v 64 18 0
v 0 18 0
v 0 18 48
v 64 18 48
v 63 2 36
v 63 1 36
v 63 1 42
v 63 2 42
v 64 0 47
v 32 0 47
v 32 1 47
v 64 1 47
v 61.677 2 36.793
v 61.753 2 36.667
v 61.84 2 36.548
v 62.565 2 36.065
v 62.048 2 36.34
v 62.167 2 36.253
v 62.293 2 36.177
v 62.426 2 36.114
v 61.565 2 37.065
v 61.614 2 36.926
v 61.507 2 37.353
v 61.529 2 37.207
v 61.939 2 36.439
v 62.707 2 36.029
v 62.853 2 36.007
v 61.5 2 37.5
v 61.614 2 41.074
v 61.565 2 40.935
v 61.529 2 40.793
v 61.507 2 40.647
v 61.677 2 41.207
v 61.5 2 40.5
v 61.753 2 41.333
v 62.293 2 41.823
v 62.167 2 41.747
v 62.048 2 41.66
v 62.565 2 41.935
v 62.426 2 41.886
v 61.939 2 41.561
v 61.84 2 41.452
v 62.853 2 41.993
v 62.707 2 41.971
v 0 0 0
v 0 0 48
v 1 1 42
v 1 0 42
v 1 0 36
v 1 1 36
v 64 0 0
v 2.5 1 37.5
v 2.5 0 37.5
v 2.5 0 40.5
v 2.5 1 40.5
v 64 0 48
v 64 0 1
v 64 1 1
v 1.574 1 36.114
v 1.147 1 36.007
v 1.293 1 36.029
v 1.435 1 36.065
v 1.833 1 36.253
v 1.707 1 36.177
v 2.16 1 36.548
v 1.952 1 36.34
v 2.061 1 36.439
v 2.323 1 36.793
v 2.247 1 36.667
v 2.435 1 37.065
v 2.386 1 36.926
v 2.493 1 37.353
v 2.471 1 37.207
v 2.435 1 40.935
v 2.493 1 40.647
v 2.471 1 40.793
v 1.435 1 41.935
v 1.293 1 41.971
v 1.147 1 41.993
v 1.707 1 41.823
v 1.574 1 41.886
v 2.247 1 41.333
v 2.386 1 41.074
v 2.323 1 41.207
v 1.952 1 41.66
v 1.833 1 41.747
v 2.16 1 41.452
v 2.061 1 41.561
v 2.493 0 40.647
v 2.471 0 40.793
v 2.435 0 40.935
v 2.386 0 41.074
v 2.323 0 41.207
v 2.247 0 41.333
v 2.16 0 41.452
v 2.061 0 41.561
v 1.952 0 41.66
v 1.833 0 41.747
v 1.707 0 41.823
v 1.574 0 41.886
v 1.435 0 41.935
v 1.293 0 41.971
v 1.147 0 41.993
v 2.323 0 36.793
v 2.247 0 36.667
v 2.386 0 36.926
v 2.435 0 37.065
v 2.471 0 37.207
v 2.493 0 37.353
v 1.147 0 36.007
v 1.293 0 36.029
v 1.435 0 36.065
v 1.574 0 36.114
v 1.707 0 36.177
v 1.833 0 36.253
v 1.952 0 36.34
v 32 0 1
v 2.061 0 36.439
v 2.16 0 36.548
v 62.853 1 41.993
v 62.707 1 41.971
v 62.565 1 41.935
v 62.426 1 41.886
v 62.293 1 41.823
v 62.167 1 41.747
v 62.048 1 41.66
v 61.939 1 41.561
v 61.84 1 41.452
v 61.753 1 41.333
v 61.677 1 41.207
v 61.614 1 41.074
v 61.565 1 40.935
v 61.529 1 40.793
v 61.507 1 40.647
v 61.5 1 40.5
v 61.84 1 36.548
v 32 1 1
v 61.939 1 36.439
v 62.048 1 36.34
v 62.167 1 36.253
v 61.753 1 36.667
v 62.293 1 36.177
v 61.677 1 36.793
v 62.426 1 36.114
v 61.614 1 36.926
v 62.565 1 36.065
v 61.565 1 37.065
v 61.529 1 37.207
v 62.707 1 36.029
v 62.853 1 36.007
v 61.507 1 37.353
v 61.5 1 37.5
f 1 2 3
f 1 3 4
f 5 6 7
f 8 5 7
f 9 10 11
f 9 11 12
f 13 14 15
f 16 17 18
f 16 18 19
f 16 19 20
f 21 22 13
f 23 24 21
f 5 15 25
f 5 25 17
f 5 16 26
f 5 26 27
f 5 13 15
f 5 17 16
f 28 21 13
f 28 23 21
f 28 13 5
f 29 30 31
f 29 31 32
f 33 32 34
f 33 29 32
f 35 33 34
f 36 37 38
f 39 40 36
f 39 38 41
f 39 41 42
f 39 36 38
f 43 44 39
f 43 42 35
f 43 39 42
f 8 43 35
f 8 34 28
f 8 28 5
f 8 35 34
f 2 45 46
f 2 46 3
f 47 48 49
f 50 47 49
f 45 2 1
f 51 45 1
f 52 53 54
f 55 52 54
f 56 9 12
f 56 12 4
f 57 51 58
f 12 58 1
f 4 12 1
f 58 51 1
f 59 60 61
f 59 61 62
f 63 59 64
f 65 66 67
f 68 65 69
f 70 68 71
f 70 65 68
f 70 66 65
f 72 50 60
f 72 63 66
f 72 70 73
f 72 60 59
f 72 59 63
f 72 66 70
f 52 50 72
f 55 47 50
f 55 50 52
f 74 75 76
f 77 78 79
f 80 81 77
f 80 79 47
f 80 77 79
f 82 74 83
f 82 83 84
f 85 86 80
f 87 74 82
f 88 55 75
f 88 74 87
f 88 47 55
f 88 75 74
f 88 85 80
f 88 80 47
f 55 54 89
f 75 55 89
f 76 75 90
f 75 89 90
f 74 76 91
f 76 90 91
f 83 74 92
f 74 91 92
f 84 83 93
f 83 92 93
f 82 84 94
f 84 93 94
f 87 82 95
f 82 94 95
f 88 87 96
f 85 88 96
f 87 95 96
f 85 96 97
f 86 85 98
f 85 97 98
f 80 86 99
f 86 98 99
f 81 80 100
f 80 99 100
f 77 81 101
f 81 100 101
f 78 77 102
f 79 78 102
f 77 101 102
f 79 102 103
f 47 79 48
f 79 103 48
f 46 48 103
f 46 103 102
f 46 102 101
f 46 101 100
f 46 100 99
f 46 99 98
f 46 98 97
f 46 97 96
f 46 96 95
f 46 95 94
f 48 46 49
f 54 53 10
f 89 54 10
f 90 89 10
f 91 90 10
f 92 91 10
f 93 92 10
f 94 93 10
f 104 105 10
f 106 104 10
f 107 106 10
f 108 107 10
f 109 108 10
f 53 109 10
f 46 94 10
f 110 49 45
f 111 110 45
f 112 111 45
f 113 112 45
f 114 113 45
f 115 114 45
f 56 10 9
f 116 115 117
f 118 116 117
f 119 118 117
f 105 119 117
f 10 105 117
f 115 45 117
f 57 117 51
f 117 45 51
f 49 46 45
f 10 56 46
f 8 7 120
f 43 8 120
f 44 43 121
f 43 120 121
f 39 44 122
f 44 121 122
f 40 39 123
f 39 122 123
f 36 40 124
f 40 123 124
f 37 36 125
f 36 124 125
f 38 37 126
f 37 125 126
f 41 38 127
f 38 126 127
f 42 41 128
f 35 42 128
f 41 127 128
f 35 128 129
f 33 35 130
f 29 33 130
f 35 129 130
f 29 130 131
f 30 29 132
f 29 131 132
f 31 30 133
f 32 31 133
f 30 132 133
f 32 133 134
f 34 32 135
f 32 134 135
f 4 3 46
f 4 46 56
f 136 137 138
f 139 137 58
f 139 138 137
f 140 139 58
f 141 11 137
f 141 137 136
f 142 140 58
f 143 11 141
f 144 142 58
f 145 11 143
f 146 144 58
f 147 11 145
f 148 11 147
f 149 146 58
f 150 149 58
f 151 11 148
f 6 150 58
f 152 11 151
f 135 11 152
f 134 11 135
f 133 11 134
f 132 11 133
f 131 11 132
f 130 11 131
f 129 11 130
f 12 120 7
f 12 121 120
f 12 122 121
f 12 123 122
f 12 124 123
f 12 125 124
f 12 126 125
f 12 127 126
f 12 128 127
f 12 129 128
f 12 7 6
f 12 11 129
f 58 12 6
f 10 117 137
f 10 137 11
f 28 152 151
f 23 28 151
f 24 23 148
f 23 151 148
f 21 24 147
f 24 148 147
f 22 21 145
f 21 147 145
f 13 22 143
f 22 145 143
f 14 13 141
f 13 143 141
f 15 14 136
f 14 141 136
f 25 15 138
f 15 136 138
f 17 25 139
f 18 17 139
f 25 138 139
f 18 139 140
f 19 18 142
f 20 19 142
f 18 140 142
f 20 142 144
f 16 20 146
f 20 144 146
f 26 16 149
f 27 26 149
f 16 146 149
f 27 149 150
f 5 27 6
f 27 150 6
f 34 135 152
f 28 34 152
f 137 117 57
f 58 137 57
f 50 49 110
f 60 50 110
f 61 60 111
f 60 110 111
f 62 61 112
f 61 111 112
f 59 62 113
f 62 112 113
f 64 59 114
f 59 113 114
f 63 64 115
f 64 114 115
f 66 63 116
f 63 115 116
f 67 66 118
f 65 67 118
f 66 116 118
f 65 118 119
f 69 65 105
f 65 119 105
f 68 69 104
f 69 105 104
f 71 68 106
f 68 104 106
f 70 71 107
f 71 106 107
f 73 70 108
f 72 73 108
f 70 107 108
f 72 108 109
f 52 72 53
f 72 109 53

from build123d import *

# Parameters (mm, degrees)
F0_W     = 64
F0_H     = 18
F1_DEPTH = 48
F2_W     = 32
F2_H     = 46
F3_DEPTH = 1
F5_DEPTH = 1
F7_DEPTH = 1


with BuildPart() as f1:
    # F0 (on Top) → F1 (new body)
    with BuildSketch(Plane.XY):
        with Locations((32, 9)):
            Rectangle(F0_W, F0_H)
    extrude(amount=F1_DEPTH)

    # F2 (on face) → F3 (cut)
    with BuildSketch(Plane.XZ):
        with Locations((48, 24)):
            Rectangle(F2_W, F2_H)
    extrude(amount=-F3_DEPTH, mode=Mode.SUBTRACT)

    # F4 (on face) → F5 (cut)
    with BuildSketch(Plane.XZ.offset(-1)):
        with BuildLine():
            ThreePointArc((63, 42), (61.93934, 41.56066), (61.5, 40.5))
            Line((61.5, 40.5), (61.5, 37.5))
            ThreePointArc((61.5, 37.5), (61.93934, 36.43934), (63, 36))
            Line((63, 36), (63, 42))
        make_face()
    extrude(amount=-F5_DEPTH, mode=Mode.SUBTRACT)

    # F6 (on face) → F7 (cut)
    with BuildSketch(Plane.XZ):
        with BuildLine():
            ThreePointArc((2.5, 40.5), (2.06066, 41.56066), (1, 42))
            Line((1, 42), (1, 36))
            ThreePointArc((1, 36), (2.06066, 36.43934), (2.5, 37.5))
            Line((2.5, 37.5), (2.5, 40.5))
        make_face()
    extrude(amount=-F7_DEPTH, mode=Mode.SUBTRACT)


solid = f1.part
